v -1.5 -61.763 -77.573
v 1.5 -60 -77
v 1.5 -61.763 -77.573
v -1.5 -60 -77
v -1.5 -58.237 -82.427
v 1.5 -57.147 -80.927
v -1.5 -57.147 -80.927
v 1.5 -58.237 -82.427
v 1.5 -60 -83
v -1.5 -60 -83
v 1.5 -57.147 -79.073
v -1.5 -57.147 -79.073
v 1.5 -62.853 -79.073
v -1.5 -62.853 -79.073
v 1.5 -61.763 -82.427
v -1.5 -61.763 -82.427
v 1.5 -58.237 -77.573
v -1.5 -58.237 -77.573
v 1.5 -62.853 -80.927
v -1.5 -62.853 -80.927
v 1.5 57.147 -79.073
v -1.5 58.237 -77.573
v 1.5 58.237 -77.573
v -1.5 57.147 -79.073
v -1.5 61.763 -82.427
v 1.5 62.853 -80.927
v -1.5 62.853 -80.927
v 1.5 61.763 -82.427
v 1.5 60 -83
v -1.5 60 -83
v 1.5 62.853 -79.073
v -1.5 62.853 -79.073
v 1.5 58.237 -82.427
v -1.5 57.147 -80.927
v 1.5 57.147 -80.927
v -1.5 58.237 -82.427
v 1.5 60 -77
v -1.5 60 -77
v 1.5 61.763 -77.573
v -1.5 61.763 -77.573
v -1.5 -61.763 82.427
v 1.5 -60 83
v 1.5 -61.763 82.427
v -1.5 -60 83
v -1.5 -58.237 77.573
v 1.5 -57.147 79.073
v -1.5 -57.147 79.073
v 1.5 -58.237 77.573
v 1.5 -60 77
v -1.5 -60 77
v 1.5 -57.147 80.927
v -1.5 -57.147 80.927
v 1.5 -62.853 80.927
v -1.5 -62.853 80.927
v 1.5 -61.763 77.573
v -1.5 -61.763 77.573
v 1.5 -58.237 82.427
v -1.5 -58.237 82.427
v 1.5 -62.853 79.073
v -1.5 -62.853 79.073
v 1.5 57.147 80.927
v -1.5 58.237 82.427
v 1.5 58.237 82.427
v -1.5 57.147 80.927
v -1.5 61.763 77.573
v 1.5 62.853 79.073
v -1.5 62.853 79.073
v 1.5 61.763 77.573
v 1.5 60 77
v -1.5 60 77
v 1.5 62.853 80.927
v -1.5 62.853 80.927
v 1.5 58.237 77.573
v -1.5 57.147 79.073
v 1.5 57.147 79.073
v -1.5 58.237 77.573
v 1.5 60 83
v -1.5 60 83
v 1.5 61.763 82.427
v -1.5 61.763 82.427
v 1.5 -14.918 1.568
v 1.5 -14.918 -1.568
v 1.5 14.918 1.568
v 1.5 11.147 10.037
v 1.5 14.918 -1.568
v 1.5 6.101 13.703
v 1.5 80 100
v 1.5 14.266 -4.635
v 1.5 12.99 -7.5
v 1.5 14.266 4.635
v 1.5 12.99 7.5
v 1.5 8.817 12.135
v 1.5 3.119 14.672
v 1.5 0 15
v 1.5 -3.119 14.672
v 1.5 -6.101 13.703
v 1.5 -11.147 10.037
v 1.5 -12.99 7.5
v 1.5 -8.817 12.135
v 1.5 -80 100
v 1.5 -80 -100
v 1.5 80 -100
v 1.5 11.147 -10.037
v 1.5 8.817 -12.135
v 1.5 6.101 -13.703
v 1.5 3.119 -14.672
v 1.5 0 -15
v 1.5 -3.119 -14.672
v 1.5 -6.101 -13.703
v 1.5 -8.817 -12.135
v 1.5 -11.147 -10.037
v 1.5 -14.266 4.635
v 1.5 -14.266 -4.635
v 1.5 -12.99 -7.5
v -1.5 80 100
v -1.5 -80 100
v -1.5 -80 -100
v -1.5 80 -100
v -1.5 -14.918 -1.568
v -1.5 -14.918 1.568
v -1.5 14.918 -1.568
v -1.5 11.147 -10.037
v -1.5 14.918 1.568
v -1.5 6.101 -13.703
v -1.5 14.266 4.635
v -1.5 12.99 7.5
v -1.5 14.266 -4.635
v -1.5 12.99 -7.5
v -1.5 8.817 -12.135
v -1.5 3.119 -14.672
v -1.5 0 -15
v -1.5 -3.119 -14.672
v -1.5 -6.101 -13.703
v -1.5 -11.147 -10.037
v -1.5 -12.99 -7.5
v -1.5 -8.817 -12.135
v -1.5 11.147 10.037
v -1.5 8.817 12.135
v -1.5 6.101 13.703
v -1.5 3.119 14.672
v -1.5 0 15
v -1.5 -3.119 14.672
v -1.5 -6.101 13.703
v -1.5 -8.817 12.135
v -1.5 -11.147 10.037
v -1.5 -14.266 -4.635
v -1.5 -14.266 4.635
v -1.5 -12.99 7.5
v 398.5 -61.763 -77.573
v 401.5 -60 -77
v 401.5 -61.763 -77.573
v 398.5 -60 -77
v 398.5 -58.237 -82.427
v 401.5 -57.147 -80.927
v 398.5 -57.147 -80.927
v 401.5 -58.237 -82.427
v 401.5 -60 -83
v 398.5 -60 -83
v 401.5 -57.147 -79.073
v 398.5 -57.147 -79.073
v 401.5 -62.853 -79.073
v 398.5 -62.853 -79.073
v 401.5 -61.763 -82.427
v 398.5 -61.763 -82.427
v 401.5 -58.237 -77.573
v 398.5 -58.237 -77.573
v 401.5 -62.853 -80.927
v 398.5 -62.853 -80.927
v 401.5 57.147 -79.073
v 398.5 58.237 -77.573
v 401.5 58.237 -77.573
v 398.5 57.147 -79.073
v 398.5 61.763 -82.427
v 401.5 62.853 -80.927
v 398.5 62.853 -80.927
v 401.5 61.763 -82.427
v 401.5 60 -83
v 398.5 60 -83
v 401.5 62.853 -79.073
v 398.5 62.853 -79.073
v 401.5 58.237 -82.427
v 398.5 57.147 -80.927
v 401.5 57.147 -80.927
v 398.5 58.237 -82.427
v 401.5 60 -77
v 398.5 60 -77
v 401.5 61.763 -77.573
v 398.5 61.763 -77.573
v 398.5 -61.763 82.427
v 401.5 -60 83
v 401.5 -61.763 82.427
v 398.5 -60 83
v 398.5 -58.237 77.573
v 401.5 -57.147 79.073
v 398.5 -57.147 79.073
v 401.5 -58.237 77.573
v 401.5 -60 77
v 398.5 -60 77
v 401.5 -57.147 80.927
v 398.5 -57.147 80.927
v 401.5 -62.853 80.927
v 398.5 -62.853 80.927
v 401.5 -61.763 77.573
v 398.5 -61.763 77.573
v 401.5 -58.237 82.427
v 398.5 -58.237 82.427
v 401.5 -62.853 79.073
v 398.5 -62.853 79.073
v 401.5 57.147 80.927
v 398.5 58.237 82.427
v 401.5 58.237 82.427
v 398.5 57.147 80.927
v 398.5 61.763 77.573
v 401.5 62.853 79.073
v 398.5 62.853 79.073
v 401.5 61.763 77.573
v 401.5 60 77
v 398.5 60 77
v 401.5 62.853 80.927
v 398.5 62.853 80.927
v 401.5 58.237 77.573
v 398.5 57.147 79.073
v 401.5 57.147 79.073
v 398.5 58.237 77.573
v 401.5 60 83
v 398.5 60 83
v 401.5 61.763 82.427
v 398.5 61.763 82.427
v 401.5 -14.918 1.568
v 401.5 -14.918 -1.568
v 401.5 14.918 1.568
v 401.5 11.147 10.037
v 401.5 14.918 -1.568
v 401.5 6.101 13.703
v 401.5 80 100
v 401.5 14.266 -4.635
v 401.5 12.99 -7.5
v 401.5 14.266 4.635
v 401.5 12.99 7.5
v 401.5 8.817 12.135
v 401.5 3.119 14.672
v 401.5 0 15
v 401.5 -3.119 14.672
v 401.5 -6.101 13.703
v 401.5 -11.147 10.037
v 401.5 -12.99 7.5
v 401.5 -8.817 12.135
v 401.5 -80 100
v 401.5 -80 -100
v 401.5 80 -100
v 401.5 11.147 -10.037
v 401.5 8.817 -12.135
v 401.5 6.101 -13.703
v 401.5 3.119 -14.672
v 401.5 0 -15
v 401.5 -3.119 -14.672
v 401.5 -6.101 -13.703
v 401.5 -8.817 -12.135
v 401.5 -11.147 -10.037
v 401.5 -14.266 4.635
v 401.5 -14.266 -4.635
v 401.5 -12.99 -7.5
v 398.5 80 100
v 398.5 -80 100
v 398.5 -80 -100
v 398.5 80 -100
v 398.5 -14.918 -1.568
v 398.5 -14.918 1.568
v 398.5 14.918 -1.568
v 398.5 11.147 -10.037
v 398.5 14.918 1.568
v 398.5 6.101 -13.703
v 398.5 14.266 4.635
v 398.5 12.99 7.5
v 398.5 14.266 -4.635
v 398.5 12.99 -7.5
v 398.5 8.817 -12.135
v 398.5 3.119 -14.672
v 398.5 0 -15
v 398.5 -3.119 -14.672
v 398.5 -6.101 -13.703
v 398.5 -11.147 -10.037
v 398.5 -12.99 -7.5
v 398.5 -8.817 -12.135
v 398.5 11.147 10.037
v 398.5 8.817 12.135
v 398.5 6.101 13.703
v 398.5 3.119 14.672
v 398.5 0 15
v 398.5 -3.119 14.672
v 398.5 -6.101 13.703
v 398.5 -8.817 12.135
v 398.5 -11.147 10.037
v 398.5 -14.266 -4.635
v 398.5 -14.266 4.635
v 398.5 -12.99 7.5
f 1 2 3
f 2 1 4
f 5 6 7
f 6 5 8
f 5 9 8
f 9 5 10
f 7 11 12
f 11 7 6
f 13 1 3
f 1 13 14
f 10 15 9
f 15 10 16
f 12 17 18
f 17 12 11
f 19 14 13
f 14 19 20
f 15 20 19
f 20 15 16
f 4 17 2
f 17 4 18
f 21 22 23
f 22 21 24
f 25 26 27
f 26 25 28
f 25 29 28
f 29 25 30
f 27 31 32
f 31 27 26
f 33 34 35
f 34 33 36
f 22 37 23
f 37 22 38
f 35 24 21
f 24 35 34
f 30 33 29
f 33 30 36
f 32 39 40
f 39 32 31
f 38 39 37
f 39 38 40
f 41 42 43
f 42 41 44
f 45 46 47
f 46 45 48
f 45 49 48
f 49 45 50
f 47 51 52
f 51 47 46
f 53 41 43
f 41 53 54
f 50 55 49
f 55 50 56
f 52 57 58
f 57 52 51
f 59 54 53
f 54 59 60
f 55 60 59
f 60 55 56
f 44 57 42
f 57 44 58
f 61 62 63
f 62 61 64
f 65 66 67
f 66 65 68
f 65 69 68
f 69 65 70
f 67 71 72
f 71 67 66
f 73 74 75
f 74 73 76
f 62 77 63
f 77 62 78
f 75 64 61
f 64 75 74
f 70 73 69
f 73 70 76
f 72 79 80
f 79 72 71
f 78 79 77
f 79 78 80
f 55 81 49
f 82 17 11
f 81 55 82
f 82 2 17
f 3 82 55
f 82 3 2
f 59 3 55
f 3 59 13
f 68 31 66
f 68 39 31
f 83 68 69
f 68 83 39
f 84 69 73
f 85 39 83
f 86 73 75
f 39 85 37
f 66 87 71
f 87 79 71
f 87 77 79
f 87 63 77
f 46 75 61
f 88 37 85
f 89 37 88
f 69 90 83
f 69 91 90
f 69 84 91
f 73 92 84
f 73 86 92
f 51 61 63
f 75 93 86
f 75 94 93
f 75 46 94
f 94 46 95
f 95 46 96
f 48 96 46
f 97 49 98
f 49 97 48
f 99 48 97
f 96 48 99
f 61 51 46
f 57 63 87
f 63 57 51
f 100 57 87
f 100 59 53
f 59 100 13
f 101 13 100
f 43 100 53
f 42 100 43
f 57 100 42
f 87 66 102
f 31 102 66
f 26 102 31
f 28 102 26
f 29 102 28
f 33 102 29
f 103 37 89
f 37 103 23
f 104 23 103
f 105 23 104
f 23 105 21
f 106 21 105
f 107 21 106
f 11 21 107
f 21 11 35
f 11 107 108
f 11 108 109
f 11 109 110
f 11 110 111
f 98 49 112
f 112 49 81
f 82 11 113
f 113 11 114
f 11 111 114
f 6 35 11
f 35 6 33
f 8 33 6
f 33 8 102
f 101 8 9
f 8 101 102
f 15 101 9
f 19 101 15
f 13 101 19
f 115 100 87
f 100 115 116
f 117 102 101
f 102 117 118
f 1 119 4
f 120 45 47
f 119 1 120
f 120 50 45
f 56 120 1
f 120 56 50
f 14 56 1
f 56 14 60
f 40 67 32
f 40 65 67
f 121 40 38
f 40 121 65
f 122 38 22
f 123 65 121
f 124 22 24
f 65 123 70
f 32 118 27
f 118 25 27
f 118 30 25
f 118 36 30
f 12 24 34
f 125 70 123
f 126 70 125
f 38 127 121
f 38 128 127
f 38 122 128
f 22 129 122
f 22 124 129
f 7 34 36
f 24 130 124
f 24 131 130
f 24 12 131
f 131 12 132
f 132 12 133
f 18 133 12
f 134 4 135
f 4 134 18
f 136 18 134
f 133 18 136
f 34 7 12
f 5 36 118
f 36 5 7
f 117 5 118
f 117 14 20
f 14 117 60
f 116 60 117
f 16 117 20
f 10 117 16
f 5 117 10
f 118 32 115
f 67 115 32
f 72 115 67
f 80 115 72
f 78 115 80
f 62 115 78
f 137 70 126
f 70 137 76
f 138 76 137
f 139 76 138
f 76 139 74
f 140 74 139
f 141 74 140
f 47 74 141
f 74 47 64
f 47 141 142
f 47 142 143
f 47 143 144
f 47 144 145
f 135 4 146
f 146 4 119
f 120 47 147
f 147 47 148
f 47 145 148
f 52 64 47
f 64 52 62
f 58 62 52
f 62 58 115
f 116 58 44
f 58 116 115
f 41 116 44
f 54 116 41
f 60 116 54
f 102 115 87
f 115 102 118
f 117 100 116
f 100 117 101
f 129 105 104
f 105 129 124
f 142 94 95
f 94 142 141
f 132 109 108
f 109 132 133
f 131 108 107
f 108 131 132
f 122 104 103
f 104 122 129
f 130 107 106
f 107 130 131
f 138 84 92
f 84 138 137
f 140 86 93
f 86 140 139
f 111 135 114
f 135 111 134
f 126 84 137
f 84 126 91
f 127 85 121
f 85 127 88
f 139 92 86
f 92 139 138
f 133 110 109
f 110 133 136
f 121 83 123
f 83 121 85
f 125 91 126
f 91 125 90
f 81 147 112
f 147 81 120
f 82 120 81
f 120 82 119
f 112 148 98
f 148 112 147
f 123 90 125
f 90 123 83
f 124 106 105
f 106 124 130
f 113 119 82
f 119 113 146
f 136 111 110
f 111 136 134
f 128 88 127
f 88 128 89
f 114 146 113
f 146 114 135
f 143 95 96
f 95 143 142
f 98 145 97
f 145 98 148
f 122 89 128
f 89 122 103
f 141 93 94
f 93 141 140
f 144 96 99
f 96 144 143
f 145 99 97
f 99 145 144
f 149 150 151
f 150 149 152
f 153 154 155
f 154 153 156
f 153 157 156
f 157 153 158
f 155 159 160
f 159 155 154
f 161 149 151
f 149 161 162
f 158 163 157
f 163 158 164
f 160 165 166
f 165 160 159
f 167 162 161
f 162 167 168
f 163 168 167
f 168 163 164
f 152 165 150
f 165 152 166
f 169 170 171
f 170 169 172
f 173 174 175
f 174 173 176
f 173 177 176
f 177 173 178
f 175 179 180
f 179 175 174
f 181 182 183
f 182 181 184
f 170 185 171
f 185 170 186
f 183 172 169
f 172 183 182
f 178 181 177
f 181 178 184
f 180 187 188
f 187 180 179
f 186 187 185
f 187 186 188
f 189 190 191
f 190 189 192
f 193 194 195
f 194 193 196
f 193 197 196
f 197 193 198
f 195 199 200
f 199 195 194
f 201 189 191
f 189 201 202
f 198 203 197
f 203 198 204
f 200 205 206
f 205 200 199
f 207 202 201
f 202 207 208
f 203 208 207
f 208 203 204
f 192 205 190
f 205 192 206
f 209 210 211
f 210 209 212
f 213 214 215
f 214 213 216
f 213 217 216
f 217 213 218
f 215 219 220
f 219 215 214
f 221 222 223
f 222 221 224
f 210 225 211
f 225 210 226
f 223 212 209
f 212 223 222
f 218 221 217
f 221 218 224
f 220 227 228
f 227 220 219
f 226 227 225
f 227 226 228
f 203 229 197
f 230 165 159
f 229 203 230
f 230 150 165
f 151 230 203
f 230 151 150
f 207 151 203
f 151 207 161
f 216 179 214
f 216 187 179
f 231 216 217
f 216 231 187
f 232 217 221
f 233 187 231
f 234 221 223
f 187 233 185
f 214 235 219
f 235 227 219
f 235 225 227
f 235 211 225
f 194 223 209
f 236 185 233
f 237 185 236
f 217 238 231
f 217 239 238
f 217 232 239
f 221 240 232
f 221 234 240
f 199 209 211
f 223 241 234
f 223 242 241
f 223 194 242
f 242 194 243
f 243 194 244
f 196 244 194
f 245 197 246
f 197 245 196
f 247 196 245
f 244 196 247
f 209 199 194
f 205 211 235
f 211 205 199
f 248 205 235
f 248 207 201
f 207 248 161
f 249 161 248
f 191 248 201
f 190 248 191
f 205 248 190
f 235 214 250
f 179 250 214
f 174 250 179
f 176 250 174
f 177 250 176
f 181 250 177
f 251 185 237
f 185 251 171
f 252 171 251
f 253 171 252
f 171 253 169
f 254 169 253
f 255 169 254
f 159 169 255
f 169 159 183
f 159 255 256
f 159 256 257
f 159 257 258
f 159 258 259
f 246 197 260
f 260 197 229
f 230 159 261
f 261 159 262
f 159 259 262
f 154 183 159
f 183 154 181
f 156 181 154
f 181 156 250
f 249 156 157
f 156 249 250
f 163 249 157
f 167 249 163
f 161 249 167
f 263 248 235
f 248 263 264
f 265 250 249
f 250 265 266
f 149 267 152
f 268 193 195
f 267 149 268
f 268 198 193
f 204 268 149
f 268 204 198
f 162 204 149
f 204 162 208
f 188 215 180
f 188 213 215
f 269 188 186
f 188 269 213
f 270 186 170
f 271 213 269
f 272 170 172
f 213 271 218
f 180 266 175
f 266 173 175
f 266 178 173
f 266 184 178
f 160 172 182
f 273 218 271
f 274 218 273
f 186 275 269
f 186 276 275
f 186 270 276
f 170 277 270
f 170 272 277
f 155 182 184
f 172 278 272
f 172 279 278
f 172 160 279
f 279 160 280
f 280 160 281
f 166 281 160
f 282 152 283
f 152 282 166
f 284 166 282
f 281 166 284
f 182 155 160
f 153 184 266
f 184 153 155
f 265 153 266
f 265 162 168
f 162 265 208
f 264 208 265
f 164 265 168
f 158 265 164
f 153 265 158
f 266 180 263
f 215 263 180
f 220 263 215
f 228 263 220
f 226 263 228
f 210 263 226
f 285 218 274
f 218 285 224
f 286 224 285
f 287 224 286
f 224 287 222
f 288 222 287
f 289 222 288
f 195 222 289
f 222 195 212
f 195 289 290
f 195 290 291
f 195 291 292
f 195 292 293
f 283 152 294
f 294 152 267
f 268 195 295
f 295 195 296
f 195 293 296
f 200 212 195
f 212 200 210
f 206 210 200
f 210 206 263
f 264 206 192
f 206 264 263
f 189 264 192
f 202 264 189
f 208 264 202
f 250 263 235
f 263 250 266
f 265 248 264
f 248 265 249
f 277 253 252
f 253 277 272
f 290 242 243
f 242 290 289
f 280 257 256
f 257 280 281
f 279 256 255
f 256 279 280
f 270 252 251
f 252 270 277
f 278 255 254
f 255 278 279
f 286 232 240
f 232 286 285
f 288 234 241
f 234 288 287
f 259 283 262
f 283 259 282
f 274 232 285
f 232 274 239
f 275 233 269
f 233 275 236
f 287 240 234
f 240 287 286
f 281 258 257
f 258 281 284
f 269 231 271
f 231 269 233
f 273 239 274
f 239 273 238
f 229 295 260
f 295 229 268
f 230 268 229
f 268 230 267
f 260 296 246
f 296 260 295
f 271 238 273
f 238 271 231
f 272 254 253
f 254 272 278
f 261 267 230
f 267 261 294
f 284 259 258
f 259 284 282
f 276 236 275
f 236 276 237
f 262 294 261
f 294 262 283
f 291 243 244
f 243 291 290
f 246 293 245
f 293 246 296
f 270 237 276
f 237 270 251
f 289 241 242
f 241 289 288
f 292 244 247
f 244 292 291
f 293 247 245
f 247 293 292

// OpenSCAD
WIDTH =   120;
HEIGHT =  160;

module two_rods(y) {
  rotate([0, 90, 0]) {
    translate([0, -y, 0])
    cylinder(5, 3, 3, true);
    translate([0, y, 0])
    cylinder(5, 3, 3, true);
  }
}

module rods(y, z) {
  translate([0, 0, -z / 2])
  two_rods(y / 2);
  translate([0, 0, z / 2])
  two_rods(y / 2);
}

module wall() {
  difference() {
    cube([3, WIDTH + 40, HEIGHT + 40], true);

    rotate([0, 90, 0])
    cylinder(5, 15, 15, true);

    rods(WIDTH, HEIGHT);
  }
}

wall();
translate([400, 0, 0])
wall();
